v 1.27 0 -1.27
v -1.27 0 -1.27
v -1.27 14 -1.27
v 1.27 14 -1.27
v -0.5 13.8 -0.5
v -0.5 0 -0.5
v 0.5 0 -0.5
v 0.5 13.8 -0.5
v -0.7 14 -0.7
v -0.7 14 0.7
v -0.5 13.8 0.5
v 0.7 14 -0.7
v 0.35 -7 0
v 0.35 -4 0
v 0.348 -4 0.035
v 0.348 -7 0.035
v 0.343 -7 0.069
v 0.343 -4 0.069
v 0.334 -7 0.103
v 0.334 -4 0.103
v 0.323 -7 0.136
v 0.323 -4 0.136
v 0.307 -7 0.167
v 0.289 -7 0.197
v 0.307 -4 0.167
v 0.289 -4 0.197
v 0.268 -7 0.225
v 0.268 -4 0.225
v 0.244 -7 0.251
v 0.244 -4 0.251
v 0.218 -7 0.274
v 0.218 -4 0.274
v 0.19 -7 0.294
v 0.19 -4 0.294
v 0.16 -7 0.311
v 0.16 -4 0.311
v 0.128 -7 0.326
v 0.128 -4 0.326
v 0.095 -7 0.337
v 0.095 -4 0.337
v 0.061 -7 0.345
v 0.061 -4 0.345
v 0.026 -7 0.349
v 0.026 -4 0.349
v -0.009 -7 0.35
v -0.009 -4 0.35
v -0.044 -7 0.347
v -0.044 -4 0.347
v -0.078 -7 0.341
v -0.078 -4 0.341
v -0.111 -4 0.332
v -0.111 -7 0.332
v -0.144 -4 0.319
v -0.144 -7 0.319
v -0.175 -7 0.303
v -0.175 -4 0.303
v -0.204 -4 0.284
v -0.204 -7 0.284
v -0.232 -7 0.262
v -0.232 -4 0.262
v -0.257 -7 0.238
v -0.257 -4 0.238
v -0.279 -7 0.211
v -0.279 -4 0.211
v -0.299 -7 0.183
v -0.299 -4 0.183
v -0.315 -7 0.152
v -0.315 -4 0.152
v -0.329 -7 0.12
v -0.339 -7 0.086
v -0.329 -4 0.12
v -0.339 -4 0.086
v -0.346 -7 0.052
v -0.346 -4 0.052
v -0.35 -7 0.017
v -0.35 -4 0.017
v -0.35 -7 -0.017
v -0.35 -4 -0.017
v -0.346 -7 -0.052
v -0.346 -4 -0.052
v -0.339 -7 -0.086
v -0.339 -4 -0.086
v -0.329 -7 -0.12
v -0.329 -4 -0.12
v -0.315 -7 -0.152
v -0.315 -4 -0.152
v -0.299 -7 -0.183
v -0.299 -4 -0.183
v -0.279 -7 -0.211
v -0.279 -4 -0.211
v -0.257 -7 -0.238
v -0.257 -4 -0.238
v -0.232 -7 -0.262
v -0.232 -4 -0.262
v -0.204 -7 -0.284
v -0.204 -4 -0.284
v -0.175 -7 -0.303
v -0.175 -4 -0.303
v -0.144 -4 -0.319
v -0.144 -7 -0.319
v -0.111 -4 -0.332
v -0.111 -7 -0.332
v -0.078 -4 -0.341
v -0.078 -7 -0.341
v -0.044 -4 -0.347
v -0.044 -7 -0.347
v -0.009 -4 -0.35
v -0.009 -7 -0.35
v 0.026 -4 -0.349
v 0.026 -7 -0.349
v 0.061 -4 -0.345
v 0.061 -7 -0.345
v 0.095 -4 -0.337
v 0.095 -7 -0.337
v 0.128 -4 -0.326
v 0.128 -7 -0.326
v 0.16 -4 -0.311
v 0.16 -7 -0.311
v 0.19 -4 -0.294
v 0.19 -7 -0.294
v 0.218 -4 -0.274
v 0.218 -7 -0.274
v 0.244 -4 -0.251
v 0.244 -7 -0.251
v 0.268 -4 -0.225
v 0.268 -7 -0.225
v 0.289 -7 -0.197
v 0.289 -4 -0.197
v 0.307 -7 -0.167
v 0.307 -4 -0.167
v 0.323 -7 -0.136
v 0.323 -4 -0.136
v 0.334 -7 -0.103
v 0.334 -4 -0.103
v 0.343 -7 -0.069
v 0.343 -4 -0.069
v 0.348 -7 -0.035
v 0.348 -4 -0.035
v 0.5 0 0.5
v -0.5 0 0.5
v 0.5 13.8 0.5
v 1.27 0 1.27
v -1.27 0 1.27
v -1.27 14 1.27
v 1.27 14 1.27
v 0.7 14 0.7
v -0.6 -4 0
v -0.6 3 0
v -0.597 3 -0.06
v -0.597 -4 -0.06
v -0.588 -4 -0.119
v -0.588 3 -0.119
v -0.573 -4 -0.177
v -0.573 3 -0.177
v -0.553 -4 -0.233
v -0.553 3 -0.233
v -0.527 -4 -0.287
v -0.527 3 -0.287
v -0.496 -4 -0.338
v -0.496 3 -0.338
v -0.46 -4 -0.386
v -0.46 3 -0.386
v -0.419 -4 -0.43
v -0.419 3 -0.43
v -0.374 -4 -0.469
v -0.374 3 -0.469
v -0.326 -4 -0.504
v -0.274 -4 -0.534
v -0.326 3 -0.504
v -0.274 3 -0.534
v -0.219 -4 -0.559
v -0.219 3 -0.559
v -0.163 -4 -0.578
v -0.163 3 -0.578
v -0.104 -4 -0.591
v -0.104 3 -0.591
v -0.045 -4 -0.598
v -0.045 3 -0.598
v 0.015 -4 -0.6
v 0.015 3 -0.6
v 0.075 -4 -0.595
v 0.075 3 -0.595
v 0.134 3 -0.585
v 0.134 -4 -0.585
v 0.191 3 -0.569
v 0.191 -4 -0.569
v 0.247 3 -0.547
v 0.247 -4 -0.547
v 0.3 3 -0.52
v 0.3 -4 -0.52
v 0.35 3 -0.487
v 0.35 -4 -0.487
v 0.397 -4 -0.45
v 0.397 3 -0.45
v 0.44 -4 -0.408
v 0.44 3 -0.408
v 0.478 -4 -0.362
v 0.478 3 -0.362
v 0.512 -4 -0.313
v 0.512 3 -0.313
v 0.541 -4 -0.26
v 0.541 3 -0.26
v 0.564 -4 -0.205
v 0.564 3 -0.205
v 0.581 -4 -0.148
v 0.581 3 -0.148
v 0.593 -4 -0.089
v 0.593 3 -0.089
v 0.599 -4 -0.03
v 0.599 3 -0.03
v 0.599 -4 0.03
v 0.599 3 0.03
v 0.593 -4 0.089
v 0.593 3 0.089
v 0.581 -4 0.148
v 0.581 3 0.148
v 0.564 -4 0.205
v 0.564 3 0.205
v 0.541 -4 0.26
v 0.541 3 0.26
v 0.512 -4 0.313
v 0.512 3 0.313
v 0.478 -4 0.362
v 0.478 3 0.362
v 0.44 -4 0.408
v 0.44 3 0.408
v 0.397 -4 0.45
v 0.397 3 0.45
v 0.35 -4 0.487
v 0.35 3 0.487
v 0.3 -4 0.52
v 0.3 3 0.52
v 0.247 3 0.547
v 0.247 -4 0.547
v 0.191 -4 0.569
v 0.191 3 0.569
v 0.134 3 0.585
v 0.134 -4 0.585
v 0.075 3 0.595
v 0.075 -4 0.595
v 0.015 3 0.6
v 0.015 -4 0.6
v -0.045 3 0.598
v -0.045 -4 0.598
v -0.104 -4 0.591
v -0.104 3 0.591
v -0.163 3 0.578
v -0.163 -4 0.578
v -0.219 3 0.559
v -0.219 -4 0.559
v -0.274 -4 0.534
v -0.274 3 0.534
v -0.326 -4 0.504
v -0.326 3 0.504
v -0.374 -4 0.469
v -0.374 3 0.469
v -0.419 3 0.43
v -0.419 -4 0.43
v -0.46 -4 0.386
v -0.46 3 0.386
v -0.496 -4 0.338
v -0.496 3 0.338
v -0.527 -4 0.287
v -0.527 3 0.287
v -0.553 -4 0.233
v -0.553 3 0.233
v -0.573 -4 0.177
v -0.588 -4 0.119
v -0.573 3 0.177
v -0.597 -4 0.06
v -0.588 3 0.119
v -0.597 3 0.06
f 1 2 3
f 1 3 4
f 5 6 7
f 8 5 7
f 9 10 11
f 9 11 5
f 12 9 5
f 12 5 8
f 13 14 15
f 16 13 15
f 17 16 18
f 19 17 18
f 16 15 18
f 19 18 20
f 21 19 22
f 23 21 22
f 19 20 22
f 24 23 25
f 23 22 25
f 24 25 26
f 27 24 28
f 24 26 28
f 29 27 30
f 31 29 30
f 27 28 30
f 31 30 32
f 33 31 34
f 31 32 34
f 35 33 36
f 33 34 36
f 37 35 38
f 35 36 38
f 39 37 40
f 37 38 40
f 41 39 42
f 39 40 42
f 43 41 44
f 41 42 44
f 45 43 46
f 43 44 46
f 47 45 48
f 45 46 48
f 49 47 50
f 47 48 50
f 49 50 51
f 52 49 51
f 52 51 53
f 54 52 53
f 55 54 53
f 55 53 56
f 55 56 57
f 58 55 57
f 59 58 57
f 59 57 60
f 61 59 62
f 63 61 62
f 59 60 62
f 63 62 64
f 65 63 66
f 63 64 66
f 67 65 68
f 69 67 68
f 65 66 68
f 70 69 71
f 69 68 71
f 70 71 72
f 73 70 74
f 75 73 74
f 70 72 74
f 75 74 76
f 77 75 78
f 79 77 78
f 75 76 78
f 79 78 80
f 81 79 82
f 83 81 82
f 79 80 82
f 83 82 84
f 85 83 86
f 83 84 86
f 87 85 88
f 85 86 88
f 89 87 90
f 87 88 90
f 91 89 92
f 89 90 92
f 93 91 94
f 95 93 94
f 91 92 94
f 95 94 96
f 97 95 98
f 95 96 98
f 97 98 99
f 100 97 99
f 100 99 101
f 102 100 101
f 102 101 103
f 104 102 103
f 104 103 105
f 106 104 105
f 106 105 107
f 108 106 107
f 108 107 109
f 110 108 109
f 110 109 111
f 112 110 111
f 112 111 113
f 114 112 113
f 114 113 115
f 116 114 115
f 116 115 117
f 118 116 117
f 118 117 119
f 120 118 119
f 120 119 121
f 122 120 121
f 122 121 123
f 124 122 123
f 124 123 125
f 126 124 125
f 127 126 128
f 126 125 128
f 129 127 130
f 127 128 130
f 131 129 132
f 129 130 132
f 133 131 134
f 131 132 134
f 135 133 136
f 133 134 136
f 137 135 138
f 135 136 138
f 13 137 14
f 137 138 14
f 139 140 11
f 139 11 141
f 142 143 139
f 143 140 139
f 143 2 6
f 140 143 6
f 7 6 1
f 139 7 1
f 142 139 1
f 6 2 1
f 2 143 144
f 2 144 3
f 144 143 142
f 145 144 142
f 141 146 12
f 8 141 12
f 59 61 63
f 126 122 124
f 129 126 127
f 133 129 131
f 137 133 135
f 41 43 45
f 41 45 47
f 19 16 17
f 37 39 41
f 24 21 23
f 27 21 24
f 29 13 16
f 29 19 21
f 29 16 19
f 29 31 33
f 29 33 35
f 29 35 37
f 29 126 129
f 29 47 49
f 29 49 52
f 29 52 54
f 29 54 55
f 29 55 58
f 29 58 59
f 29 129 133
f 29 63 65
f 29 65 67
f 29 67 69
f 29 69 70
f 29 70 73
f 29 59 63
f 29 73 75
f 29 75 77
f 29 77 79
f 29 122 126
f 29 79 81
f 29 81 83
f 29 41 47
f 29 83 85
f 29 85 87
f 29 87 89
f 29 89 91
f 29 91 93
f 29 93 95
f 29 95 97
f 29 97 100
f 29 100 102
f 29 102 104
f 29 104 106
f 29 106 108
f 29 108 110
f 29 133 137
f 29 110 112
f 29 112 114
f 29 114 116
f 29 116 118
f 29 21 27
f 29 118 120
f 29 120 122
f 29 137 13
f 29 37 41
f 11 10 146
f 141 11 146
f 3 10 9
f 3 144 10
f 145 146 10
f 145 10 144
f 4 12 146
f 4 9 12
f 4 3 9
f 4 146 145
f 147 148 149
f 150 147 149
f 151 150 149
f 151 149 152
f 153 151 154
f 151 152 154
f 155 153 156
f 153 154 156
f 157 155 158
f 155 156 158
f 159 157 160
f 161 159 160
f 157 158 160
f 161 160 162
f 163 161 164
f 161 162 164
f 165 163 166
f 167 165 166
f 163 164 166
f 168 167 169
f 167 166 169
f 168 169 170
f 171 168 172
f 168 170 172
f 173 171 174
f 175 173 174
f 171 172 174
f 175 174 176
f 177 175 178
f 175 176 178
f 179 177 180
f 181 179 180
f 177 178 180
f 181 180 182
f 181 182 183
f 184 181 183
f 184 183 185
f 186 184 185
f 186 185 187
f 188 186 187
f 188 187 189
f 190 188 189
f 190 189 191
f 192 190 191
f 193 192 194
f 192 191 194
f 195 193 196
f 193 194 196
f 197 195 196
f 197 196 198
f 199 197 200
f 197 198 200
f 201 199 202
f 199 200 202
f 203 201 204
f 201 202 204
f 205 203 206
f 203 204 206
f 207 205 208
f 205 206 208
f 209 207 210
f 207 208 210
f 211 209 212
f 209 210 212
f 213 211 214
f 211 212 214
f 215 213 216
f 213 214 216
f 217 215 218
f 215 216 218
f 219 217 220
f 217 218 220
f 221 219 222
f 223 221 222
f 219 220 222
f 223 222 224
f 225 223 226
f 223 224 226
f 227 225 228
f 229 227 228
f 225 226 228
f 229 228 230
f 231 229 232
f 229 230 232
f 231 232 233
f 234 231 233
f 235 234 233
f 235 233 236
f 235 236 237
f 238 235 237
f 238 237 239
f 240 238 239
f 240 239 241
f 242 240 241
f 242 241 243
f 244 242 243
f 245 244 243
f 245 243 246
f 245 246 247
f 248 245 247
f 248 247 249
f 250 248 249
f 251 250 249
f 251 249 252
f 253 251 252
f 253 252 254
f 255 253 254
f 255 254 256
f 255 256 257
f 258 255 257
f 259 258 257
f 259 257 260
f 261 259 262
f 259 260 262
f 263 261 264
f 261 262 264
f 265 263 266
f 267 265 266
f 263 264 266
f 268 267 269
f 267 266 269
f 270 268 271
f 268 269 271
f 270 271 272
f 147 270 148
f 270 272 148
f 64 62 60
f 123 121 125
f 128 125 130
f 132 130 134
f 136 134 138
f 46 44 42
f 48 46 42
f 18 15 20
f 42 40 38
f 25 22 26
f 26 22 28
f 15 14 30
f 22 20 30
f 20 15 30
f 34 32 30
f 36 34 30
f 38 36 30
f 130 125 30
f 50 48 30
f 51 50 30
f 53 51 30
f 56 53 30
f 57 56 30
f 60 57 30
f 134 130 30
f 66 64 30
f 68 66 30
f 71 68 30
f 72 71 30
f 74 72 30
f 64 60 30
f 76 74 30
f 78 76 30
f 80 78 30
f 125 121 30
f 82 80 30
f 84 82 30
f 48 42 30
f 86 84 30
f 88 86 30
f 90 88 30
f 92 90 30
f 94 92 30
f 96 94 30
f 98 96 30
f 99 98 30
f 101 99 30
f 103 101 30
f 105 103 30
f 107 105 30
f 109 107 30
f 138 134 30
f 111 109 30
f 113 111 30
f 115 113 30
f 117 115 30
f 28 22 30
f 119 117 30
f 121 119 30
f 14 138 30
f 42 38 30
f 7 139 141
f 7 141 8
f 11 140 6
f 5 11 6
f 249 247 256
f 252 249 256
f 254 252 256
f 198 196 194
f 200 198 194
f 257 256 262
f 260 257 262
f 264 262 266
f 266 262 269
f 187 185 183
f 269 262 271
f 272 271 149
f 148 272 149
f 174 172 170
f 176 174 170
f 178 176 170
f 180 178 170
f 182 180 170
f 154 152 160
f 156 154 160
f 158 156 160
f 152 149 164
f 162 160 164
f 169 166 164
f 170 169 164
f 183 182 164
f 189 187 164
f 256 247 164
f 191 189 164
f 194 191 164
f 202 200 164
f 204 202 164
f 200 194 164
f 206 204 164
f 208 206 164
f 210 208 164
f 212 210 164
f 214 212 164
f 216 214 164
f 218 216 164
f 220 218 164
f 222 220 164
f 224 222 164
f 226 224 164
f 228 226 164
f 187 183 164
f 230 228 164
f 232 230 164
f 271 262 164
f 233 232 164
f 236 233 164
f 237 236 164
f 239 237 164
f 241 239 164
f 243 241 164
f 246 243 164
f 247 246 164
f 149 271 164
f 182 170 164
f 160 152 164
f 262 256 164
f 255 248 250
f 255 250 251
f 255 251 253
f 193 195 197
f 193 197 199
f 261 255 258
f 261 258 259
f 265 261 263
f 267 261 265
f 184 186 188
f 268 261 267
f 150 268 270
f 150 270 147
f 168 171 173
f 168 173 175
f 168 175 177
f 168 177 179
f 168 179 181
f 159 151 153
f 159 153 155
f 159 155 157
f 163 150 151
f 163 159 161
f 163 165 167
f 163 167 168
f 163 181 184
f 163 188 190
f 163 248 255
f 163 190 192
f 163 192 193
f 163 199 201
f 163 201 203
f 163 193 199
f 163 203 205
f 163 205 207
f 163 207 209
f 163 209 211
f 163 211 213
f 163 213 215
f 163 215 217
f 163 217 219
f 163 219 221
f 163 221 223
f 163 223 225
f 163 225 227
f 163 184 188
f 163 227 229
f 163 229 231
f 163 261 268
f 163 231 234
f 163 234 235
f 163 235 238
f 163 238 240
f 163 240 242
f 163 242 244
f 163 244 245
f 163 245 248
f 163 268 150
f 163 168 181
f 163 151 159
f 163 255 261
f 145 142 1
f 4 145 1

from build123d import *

# Parameters (mm, degrees)
SKETCH_1_W      = 2.54
SKETCH_1_H      = 2.54
SKETCH_1_W_2    = 1
SKETCH_1_H_2    = 1
EXTRUDE_1_DEPTH = 14
CHAMFER_1_SIZE  = 0.2
SKETCH_3_R      = 0.6
EXTRUDE_2_DEPTH = 7
SKETCH_4_R      = 0.35
EXTRUDE_3_DEPTH = 3


with BuildPart() as part:
    # Эскиз1 → Бобышка-Вытянуть1 (new body)
    with BuildSketch(Plane(origin=(0, 0, 0), x_dir=(1, 0, 0), z_dir=(0, 1, 0))):
        Rectangle(SKETCH_1_W, SKETCH_1_H)
        Rectangle(SKETCH_1_W_2, SKETCH_1_H_2, mode=Mode.SUBTRACT)
    extrude(amount=EXTRUDE_1_DEPTH)

    # Фаска1
    chamfer_1_edges = [part.edges().sort_by_distance(p)[0] for p in [
        (0.5, 14, 0),
        (0, 14, -0.5),
        (-0.5, 14, 0),
        (0, 14, 0.5),
    ]]
    chamfer(chamfer_1_edges, length=CHAMFER_1_SIZE)


with BuildPart() as body_2:
    # Эскиз3 → Бобышка-Вытянуть2 (new body)
    with BuildSketch(Plane(origin=(0, 3, 0), x_dir=(-1, 0, 0), z_dir=(0, -1, 0))):
        Circle(SKETCH_3_R)
    extrude(amount=EXTRUDE_2_DEPTH)


with BuildPart() as body_3:
    # Эскиз4 → Бобышка-Вытянуть3 (new body)
    with BuildSketch(Plane.XZ.offset(4)):
        Circle(SKETCH_4_R)
    extrude(amount=EXTRUDE_3_DEPTH)


solid = Compound([part.part, body_2.part, body_3.part])
